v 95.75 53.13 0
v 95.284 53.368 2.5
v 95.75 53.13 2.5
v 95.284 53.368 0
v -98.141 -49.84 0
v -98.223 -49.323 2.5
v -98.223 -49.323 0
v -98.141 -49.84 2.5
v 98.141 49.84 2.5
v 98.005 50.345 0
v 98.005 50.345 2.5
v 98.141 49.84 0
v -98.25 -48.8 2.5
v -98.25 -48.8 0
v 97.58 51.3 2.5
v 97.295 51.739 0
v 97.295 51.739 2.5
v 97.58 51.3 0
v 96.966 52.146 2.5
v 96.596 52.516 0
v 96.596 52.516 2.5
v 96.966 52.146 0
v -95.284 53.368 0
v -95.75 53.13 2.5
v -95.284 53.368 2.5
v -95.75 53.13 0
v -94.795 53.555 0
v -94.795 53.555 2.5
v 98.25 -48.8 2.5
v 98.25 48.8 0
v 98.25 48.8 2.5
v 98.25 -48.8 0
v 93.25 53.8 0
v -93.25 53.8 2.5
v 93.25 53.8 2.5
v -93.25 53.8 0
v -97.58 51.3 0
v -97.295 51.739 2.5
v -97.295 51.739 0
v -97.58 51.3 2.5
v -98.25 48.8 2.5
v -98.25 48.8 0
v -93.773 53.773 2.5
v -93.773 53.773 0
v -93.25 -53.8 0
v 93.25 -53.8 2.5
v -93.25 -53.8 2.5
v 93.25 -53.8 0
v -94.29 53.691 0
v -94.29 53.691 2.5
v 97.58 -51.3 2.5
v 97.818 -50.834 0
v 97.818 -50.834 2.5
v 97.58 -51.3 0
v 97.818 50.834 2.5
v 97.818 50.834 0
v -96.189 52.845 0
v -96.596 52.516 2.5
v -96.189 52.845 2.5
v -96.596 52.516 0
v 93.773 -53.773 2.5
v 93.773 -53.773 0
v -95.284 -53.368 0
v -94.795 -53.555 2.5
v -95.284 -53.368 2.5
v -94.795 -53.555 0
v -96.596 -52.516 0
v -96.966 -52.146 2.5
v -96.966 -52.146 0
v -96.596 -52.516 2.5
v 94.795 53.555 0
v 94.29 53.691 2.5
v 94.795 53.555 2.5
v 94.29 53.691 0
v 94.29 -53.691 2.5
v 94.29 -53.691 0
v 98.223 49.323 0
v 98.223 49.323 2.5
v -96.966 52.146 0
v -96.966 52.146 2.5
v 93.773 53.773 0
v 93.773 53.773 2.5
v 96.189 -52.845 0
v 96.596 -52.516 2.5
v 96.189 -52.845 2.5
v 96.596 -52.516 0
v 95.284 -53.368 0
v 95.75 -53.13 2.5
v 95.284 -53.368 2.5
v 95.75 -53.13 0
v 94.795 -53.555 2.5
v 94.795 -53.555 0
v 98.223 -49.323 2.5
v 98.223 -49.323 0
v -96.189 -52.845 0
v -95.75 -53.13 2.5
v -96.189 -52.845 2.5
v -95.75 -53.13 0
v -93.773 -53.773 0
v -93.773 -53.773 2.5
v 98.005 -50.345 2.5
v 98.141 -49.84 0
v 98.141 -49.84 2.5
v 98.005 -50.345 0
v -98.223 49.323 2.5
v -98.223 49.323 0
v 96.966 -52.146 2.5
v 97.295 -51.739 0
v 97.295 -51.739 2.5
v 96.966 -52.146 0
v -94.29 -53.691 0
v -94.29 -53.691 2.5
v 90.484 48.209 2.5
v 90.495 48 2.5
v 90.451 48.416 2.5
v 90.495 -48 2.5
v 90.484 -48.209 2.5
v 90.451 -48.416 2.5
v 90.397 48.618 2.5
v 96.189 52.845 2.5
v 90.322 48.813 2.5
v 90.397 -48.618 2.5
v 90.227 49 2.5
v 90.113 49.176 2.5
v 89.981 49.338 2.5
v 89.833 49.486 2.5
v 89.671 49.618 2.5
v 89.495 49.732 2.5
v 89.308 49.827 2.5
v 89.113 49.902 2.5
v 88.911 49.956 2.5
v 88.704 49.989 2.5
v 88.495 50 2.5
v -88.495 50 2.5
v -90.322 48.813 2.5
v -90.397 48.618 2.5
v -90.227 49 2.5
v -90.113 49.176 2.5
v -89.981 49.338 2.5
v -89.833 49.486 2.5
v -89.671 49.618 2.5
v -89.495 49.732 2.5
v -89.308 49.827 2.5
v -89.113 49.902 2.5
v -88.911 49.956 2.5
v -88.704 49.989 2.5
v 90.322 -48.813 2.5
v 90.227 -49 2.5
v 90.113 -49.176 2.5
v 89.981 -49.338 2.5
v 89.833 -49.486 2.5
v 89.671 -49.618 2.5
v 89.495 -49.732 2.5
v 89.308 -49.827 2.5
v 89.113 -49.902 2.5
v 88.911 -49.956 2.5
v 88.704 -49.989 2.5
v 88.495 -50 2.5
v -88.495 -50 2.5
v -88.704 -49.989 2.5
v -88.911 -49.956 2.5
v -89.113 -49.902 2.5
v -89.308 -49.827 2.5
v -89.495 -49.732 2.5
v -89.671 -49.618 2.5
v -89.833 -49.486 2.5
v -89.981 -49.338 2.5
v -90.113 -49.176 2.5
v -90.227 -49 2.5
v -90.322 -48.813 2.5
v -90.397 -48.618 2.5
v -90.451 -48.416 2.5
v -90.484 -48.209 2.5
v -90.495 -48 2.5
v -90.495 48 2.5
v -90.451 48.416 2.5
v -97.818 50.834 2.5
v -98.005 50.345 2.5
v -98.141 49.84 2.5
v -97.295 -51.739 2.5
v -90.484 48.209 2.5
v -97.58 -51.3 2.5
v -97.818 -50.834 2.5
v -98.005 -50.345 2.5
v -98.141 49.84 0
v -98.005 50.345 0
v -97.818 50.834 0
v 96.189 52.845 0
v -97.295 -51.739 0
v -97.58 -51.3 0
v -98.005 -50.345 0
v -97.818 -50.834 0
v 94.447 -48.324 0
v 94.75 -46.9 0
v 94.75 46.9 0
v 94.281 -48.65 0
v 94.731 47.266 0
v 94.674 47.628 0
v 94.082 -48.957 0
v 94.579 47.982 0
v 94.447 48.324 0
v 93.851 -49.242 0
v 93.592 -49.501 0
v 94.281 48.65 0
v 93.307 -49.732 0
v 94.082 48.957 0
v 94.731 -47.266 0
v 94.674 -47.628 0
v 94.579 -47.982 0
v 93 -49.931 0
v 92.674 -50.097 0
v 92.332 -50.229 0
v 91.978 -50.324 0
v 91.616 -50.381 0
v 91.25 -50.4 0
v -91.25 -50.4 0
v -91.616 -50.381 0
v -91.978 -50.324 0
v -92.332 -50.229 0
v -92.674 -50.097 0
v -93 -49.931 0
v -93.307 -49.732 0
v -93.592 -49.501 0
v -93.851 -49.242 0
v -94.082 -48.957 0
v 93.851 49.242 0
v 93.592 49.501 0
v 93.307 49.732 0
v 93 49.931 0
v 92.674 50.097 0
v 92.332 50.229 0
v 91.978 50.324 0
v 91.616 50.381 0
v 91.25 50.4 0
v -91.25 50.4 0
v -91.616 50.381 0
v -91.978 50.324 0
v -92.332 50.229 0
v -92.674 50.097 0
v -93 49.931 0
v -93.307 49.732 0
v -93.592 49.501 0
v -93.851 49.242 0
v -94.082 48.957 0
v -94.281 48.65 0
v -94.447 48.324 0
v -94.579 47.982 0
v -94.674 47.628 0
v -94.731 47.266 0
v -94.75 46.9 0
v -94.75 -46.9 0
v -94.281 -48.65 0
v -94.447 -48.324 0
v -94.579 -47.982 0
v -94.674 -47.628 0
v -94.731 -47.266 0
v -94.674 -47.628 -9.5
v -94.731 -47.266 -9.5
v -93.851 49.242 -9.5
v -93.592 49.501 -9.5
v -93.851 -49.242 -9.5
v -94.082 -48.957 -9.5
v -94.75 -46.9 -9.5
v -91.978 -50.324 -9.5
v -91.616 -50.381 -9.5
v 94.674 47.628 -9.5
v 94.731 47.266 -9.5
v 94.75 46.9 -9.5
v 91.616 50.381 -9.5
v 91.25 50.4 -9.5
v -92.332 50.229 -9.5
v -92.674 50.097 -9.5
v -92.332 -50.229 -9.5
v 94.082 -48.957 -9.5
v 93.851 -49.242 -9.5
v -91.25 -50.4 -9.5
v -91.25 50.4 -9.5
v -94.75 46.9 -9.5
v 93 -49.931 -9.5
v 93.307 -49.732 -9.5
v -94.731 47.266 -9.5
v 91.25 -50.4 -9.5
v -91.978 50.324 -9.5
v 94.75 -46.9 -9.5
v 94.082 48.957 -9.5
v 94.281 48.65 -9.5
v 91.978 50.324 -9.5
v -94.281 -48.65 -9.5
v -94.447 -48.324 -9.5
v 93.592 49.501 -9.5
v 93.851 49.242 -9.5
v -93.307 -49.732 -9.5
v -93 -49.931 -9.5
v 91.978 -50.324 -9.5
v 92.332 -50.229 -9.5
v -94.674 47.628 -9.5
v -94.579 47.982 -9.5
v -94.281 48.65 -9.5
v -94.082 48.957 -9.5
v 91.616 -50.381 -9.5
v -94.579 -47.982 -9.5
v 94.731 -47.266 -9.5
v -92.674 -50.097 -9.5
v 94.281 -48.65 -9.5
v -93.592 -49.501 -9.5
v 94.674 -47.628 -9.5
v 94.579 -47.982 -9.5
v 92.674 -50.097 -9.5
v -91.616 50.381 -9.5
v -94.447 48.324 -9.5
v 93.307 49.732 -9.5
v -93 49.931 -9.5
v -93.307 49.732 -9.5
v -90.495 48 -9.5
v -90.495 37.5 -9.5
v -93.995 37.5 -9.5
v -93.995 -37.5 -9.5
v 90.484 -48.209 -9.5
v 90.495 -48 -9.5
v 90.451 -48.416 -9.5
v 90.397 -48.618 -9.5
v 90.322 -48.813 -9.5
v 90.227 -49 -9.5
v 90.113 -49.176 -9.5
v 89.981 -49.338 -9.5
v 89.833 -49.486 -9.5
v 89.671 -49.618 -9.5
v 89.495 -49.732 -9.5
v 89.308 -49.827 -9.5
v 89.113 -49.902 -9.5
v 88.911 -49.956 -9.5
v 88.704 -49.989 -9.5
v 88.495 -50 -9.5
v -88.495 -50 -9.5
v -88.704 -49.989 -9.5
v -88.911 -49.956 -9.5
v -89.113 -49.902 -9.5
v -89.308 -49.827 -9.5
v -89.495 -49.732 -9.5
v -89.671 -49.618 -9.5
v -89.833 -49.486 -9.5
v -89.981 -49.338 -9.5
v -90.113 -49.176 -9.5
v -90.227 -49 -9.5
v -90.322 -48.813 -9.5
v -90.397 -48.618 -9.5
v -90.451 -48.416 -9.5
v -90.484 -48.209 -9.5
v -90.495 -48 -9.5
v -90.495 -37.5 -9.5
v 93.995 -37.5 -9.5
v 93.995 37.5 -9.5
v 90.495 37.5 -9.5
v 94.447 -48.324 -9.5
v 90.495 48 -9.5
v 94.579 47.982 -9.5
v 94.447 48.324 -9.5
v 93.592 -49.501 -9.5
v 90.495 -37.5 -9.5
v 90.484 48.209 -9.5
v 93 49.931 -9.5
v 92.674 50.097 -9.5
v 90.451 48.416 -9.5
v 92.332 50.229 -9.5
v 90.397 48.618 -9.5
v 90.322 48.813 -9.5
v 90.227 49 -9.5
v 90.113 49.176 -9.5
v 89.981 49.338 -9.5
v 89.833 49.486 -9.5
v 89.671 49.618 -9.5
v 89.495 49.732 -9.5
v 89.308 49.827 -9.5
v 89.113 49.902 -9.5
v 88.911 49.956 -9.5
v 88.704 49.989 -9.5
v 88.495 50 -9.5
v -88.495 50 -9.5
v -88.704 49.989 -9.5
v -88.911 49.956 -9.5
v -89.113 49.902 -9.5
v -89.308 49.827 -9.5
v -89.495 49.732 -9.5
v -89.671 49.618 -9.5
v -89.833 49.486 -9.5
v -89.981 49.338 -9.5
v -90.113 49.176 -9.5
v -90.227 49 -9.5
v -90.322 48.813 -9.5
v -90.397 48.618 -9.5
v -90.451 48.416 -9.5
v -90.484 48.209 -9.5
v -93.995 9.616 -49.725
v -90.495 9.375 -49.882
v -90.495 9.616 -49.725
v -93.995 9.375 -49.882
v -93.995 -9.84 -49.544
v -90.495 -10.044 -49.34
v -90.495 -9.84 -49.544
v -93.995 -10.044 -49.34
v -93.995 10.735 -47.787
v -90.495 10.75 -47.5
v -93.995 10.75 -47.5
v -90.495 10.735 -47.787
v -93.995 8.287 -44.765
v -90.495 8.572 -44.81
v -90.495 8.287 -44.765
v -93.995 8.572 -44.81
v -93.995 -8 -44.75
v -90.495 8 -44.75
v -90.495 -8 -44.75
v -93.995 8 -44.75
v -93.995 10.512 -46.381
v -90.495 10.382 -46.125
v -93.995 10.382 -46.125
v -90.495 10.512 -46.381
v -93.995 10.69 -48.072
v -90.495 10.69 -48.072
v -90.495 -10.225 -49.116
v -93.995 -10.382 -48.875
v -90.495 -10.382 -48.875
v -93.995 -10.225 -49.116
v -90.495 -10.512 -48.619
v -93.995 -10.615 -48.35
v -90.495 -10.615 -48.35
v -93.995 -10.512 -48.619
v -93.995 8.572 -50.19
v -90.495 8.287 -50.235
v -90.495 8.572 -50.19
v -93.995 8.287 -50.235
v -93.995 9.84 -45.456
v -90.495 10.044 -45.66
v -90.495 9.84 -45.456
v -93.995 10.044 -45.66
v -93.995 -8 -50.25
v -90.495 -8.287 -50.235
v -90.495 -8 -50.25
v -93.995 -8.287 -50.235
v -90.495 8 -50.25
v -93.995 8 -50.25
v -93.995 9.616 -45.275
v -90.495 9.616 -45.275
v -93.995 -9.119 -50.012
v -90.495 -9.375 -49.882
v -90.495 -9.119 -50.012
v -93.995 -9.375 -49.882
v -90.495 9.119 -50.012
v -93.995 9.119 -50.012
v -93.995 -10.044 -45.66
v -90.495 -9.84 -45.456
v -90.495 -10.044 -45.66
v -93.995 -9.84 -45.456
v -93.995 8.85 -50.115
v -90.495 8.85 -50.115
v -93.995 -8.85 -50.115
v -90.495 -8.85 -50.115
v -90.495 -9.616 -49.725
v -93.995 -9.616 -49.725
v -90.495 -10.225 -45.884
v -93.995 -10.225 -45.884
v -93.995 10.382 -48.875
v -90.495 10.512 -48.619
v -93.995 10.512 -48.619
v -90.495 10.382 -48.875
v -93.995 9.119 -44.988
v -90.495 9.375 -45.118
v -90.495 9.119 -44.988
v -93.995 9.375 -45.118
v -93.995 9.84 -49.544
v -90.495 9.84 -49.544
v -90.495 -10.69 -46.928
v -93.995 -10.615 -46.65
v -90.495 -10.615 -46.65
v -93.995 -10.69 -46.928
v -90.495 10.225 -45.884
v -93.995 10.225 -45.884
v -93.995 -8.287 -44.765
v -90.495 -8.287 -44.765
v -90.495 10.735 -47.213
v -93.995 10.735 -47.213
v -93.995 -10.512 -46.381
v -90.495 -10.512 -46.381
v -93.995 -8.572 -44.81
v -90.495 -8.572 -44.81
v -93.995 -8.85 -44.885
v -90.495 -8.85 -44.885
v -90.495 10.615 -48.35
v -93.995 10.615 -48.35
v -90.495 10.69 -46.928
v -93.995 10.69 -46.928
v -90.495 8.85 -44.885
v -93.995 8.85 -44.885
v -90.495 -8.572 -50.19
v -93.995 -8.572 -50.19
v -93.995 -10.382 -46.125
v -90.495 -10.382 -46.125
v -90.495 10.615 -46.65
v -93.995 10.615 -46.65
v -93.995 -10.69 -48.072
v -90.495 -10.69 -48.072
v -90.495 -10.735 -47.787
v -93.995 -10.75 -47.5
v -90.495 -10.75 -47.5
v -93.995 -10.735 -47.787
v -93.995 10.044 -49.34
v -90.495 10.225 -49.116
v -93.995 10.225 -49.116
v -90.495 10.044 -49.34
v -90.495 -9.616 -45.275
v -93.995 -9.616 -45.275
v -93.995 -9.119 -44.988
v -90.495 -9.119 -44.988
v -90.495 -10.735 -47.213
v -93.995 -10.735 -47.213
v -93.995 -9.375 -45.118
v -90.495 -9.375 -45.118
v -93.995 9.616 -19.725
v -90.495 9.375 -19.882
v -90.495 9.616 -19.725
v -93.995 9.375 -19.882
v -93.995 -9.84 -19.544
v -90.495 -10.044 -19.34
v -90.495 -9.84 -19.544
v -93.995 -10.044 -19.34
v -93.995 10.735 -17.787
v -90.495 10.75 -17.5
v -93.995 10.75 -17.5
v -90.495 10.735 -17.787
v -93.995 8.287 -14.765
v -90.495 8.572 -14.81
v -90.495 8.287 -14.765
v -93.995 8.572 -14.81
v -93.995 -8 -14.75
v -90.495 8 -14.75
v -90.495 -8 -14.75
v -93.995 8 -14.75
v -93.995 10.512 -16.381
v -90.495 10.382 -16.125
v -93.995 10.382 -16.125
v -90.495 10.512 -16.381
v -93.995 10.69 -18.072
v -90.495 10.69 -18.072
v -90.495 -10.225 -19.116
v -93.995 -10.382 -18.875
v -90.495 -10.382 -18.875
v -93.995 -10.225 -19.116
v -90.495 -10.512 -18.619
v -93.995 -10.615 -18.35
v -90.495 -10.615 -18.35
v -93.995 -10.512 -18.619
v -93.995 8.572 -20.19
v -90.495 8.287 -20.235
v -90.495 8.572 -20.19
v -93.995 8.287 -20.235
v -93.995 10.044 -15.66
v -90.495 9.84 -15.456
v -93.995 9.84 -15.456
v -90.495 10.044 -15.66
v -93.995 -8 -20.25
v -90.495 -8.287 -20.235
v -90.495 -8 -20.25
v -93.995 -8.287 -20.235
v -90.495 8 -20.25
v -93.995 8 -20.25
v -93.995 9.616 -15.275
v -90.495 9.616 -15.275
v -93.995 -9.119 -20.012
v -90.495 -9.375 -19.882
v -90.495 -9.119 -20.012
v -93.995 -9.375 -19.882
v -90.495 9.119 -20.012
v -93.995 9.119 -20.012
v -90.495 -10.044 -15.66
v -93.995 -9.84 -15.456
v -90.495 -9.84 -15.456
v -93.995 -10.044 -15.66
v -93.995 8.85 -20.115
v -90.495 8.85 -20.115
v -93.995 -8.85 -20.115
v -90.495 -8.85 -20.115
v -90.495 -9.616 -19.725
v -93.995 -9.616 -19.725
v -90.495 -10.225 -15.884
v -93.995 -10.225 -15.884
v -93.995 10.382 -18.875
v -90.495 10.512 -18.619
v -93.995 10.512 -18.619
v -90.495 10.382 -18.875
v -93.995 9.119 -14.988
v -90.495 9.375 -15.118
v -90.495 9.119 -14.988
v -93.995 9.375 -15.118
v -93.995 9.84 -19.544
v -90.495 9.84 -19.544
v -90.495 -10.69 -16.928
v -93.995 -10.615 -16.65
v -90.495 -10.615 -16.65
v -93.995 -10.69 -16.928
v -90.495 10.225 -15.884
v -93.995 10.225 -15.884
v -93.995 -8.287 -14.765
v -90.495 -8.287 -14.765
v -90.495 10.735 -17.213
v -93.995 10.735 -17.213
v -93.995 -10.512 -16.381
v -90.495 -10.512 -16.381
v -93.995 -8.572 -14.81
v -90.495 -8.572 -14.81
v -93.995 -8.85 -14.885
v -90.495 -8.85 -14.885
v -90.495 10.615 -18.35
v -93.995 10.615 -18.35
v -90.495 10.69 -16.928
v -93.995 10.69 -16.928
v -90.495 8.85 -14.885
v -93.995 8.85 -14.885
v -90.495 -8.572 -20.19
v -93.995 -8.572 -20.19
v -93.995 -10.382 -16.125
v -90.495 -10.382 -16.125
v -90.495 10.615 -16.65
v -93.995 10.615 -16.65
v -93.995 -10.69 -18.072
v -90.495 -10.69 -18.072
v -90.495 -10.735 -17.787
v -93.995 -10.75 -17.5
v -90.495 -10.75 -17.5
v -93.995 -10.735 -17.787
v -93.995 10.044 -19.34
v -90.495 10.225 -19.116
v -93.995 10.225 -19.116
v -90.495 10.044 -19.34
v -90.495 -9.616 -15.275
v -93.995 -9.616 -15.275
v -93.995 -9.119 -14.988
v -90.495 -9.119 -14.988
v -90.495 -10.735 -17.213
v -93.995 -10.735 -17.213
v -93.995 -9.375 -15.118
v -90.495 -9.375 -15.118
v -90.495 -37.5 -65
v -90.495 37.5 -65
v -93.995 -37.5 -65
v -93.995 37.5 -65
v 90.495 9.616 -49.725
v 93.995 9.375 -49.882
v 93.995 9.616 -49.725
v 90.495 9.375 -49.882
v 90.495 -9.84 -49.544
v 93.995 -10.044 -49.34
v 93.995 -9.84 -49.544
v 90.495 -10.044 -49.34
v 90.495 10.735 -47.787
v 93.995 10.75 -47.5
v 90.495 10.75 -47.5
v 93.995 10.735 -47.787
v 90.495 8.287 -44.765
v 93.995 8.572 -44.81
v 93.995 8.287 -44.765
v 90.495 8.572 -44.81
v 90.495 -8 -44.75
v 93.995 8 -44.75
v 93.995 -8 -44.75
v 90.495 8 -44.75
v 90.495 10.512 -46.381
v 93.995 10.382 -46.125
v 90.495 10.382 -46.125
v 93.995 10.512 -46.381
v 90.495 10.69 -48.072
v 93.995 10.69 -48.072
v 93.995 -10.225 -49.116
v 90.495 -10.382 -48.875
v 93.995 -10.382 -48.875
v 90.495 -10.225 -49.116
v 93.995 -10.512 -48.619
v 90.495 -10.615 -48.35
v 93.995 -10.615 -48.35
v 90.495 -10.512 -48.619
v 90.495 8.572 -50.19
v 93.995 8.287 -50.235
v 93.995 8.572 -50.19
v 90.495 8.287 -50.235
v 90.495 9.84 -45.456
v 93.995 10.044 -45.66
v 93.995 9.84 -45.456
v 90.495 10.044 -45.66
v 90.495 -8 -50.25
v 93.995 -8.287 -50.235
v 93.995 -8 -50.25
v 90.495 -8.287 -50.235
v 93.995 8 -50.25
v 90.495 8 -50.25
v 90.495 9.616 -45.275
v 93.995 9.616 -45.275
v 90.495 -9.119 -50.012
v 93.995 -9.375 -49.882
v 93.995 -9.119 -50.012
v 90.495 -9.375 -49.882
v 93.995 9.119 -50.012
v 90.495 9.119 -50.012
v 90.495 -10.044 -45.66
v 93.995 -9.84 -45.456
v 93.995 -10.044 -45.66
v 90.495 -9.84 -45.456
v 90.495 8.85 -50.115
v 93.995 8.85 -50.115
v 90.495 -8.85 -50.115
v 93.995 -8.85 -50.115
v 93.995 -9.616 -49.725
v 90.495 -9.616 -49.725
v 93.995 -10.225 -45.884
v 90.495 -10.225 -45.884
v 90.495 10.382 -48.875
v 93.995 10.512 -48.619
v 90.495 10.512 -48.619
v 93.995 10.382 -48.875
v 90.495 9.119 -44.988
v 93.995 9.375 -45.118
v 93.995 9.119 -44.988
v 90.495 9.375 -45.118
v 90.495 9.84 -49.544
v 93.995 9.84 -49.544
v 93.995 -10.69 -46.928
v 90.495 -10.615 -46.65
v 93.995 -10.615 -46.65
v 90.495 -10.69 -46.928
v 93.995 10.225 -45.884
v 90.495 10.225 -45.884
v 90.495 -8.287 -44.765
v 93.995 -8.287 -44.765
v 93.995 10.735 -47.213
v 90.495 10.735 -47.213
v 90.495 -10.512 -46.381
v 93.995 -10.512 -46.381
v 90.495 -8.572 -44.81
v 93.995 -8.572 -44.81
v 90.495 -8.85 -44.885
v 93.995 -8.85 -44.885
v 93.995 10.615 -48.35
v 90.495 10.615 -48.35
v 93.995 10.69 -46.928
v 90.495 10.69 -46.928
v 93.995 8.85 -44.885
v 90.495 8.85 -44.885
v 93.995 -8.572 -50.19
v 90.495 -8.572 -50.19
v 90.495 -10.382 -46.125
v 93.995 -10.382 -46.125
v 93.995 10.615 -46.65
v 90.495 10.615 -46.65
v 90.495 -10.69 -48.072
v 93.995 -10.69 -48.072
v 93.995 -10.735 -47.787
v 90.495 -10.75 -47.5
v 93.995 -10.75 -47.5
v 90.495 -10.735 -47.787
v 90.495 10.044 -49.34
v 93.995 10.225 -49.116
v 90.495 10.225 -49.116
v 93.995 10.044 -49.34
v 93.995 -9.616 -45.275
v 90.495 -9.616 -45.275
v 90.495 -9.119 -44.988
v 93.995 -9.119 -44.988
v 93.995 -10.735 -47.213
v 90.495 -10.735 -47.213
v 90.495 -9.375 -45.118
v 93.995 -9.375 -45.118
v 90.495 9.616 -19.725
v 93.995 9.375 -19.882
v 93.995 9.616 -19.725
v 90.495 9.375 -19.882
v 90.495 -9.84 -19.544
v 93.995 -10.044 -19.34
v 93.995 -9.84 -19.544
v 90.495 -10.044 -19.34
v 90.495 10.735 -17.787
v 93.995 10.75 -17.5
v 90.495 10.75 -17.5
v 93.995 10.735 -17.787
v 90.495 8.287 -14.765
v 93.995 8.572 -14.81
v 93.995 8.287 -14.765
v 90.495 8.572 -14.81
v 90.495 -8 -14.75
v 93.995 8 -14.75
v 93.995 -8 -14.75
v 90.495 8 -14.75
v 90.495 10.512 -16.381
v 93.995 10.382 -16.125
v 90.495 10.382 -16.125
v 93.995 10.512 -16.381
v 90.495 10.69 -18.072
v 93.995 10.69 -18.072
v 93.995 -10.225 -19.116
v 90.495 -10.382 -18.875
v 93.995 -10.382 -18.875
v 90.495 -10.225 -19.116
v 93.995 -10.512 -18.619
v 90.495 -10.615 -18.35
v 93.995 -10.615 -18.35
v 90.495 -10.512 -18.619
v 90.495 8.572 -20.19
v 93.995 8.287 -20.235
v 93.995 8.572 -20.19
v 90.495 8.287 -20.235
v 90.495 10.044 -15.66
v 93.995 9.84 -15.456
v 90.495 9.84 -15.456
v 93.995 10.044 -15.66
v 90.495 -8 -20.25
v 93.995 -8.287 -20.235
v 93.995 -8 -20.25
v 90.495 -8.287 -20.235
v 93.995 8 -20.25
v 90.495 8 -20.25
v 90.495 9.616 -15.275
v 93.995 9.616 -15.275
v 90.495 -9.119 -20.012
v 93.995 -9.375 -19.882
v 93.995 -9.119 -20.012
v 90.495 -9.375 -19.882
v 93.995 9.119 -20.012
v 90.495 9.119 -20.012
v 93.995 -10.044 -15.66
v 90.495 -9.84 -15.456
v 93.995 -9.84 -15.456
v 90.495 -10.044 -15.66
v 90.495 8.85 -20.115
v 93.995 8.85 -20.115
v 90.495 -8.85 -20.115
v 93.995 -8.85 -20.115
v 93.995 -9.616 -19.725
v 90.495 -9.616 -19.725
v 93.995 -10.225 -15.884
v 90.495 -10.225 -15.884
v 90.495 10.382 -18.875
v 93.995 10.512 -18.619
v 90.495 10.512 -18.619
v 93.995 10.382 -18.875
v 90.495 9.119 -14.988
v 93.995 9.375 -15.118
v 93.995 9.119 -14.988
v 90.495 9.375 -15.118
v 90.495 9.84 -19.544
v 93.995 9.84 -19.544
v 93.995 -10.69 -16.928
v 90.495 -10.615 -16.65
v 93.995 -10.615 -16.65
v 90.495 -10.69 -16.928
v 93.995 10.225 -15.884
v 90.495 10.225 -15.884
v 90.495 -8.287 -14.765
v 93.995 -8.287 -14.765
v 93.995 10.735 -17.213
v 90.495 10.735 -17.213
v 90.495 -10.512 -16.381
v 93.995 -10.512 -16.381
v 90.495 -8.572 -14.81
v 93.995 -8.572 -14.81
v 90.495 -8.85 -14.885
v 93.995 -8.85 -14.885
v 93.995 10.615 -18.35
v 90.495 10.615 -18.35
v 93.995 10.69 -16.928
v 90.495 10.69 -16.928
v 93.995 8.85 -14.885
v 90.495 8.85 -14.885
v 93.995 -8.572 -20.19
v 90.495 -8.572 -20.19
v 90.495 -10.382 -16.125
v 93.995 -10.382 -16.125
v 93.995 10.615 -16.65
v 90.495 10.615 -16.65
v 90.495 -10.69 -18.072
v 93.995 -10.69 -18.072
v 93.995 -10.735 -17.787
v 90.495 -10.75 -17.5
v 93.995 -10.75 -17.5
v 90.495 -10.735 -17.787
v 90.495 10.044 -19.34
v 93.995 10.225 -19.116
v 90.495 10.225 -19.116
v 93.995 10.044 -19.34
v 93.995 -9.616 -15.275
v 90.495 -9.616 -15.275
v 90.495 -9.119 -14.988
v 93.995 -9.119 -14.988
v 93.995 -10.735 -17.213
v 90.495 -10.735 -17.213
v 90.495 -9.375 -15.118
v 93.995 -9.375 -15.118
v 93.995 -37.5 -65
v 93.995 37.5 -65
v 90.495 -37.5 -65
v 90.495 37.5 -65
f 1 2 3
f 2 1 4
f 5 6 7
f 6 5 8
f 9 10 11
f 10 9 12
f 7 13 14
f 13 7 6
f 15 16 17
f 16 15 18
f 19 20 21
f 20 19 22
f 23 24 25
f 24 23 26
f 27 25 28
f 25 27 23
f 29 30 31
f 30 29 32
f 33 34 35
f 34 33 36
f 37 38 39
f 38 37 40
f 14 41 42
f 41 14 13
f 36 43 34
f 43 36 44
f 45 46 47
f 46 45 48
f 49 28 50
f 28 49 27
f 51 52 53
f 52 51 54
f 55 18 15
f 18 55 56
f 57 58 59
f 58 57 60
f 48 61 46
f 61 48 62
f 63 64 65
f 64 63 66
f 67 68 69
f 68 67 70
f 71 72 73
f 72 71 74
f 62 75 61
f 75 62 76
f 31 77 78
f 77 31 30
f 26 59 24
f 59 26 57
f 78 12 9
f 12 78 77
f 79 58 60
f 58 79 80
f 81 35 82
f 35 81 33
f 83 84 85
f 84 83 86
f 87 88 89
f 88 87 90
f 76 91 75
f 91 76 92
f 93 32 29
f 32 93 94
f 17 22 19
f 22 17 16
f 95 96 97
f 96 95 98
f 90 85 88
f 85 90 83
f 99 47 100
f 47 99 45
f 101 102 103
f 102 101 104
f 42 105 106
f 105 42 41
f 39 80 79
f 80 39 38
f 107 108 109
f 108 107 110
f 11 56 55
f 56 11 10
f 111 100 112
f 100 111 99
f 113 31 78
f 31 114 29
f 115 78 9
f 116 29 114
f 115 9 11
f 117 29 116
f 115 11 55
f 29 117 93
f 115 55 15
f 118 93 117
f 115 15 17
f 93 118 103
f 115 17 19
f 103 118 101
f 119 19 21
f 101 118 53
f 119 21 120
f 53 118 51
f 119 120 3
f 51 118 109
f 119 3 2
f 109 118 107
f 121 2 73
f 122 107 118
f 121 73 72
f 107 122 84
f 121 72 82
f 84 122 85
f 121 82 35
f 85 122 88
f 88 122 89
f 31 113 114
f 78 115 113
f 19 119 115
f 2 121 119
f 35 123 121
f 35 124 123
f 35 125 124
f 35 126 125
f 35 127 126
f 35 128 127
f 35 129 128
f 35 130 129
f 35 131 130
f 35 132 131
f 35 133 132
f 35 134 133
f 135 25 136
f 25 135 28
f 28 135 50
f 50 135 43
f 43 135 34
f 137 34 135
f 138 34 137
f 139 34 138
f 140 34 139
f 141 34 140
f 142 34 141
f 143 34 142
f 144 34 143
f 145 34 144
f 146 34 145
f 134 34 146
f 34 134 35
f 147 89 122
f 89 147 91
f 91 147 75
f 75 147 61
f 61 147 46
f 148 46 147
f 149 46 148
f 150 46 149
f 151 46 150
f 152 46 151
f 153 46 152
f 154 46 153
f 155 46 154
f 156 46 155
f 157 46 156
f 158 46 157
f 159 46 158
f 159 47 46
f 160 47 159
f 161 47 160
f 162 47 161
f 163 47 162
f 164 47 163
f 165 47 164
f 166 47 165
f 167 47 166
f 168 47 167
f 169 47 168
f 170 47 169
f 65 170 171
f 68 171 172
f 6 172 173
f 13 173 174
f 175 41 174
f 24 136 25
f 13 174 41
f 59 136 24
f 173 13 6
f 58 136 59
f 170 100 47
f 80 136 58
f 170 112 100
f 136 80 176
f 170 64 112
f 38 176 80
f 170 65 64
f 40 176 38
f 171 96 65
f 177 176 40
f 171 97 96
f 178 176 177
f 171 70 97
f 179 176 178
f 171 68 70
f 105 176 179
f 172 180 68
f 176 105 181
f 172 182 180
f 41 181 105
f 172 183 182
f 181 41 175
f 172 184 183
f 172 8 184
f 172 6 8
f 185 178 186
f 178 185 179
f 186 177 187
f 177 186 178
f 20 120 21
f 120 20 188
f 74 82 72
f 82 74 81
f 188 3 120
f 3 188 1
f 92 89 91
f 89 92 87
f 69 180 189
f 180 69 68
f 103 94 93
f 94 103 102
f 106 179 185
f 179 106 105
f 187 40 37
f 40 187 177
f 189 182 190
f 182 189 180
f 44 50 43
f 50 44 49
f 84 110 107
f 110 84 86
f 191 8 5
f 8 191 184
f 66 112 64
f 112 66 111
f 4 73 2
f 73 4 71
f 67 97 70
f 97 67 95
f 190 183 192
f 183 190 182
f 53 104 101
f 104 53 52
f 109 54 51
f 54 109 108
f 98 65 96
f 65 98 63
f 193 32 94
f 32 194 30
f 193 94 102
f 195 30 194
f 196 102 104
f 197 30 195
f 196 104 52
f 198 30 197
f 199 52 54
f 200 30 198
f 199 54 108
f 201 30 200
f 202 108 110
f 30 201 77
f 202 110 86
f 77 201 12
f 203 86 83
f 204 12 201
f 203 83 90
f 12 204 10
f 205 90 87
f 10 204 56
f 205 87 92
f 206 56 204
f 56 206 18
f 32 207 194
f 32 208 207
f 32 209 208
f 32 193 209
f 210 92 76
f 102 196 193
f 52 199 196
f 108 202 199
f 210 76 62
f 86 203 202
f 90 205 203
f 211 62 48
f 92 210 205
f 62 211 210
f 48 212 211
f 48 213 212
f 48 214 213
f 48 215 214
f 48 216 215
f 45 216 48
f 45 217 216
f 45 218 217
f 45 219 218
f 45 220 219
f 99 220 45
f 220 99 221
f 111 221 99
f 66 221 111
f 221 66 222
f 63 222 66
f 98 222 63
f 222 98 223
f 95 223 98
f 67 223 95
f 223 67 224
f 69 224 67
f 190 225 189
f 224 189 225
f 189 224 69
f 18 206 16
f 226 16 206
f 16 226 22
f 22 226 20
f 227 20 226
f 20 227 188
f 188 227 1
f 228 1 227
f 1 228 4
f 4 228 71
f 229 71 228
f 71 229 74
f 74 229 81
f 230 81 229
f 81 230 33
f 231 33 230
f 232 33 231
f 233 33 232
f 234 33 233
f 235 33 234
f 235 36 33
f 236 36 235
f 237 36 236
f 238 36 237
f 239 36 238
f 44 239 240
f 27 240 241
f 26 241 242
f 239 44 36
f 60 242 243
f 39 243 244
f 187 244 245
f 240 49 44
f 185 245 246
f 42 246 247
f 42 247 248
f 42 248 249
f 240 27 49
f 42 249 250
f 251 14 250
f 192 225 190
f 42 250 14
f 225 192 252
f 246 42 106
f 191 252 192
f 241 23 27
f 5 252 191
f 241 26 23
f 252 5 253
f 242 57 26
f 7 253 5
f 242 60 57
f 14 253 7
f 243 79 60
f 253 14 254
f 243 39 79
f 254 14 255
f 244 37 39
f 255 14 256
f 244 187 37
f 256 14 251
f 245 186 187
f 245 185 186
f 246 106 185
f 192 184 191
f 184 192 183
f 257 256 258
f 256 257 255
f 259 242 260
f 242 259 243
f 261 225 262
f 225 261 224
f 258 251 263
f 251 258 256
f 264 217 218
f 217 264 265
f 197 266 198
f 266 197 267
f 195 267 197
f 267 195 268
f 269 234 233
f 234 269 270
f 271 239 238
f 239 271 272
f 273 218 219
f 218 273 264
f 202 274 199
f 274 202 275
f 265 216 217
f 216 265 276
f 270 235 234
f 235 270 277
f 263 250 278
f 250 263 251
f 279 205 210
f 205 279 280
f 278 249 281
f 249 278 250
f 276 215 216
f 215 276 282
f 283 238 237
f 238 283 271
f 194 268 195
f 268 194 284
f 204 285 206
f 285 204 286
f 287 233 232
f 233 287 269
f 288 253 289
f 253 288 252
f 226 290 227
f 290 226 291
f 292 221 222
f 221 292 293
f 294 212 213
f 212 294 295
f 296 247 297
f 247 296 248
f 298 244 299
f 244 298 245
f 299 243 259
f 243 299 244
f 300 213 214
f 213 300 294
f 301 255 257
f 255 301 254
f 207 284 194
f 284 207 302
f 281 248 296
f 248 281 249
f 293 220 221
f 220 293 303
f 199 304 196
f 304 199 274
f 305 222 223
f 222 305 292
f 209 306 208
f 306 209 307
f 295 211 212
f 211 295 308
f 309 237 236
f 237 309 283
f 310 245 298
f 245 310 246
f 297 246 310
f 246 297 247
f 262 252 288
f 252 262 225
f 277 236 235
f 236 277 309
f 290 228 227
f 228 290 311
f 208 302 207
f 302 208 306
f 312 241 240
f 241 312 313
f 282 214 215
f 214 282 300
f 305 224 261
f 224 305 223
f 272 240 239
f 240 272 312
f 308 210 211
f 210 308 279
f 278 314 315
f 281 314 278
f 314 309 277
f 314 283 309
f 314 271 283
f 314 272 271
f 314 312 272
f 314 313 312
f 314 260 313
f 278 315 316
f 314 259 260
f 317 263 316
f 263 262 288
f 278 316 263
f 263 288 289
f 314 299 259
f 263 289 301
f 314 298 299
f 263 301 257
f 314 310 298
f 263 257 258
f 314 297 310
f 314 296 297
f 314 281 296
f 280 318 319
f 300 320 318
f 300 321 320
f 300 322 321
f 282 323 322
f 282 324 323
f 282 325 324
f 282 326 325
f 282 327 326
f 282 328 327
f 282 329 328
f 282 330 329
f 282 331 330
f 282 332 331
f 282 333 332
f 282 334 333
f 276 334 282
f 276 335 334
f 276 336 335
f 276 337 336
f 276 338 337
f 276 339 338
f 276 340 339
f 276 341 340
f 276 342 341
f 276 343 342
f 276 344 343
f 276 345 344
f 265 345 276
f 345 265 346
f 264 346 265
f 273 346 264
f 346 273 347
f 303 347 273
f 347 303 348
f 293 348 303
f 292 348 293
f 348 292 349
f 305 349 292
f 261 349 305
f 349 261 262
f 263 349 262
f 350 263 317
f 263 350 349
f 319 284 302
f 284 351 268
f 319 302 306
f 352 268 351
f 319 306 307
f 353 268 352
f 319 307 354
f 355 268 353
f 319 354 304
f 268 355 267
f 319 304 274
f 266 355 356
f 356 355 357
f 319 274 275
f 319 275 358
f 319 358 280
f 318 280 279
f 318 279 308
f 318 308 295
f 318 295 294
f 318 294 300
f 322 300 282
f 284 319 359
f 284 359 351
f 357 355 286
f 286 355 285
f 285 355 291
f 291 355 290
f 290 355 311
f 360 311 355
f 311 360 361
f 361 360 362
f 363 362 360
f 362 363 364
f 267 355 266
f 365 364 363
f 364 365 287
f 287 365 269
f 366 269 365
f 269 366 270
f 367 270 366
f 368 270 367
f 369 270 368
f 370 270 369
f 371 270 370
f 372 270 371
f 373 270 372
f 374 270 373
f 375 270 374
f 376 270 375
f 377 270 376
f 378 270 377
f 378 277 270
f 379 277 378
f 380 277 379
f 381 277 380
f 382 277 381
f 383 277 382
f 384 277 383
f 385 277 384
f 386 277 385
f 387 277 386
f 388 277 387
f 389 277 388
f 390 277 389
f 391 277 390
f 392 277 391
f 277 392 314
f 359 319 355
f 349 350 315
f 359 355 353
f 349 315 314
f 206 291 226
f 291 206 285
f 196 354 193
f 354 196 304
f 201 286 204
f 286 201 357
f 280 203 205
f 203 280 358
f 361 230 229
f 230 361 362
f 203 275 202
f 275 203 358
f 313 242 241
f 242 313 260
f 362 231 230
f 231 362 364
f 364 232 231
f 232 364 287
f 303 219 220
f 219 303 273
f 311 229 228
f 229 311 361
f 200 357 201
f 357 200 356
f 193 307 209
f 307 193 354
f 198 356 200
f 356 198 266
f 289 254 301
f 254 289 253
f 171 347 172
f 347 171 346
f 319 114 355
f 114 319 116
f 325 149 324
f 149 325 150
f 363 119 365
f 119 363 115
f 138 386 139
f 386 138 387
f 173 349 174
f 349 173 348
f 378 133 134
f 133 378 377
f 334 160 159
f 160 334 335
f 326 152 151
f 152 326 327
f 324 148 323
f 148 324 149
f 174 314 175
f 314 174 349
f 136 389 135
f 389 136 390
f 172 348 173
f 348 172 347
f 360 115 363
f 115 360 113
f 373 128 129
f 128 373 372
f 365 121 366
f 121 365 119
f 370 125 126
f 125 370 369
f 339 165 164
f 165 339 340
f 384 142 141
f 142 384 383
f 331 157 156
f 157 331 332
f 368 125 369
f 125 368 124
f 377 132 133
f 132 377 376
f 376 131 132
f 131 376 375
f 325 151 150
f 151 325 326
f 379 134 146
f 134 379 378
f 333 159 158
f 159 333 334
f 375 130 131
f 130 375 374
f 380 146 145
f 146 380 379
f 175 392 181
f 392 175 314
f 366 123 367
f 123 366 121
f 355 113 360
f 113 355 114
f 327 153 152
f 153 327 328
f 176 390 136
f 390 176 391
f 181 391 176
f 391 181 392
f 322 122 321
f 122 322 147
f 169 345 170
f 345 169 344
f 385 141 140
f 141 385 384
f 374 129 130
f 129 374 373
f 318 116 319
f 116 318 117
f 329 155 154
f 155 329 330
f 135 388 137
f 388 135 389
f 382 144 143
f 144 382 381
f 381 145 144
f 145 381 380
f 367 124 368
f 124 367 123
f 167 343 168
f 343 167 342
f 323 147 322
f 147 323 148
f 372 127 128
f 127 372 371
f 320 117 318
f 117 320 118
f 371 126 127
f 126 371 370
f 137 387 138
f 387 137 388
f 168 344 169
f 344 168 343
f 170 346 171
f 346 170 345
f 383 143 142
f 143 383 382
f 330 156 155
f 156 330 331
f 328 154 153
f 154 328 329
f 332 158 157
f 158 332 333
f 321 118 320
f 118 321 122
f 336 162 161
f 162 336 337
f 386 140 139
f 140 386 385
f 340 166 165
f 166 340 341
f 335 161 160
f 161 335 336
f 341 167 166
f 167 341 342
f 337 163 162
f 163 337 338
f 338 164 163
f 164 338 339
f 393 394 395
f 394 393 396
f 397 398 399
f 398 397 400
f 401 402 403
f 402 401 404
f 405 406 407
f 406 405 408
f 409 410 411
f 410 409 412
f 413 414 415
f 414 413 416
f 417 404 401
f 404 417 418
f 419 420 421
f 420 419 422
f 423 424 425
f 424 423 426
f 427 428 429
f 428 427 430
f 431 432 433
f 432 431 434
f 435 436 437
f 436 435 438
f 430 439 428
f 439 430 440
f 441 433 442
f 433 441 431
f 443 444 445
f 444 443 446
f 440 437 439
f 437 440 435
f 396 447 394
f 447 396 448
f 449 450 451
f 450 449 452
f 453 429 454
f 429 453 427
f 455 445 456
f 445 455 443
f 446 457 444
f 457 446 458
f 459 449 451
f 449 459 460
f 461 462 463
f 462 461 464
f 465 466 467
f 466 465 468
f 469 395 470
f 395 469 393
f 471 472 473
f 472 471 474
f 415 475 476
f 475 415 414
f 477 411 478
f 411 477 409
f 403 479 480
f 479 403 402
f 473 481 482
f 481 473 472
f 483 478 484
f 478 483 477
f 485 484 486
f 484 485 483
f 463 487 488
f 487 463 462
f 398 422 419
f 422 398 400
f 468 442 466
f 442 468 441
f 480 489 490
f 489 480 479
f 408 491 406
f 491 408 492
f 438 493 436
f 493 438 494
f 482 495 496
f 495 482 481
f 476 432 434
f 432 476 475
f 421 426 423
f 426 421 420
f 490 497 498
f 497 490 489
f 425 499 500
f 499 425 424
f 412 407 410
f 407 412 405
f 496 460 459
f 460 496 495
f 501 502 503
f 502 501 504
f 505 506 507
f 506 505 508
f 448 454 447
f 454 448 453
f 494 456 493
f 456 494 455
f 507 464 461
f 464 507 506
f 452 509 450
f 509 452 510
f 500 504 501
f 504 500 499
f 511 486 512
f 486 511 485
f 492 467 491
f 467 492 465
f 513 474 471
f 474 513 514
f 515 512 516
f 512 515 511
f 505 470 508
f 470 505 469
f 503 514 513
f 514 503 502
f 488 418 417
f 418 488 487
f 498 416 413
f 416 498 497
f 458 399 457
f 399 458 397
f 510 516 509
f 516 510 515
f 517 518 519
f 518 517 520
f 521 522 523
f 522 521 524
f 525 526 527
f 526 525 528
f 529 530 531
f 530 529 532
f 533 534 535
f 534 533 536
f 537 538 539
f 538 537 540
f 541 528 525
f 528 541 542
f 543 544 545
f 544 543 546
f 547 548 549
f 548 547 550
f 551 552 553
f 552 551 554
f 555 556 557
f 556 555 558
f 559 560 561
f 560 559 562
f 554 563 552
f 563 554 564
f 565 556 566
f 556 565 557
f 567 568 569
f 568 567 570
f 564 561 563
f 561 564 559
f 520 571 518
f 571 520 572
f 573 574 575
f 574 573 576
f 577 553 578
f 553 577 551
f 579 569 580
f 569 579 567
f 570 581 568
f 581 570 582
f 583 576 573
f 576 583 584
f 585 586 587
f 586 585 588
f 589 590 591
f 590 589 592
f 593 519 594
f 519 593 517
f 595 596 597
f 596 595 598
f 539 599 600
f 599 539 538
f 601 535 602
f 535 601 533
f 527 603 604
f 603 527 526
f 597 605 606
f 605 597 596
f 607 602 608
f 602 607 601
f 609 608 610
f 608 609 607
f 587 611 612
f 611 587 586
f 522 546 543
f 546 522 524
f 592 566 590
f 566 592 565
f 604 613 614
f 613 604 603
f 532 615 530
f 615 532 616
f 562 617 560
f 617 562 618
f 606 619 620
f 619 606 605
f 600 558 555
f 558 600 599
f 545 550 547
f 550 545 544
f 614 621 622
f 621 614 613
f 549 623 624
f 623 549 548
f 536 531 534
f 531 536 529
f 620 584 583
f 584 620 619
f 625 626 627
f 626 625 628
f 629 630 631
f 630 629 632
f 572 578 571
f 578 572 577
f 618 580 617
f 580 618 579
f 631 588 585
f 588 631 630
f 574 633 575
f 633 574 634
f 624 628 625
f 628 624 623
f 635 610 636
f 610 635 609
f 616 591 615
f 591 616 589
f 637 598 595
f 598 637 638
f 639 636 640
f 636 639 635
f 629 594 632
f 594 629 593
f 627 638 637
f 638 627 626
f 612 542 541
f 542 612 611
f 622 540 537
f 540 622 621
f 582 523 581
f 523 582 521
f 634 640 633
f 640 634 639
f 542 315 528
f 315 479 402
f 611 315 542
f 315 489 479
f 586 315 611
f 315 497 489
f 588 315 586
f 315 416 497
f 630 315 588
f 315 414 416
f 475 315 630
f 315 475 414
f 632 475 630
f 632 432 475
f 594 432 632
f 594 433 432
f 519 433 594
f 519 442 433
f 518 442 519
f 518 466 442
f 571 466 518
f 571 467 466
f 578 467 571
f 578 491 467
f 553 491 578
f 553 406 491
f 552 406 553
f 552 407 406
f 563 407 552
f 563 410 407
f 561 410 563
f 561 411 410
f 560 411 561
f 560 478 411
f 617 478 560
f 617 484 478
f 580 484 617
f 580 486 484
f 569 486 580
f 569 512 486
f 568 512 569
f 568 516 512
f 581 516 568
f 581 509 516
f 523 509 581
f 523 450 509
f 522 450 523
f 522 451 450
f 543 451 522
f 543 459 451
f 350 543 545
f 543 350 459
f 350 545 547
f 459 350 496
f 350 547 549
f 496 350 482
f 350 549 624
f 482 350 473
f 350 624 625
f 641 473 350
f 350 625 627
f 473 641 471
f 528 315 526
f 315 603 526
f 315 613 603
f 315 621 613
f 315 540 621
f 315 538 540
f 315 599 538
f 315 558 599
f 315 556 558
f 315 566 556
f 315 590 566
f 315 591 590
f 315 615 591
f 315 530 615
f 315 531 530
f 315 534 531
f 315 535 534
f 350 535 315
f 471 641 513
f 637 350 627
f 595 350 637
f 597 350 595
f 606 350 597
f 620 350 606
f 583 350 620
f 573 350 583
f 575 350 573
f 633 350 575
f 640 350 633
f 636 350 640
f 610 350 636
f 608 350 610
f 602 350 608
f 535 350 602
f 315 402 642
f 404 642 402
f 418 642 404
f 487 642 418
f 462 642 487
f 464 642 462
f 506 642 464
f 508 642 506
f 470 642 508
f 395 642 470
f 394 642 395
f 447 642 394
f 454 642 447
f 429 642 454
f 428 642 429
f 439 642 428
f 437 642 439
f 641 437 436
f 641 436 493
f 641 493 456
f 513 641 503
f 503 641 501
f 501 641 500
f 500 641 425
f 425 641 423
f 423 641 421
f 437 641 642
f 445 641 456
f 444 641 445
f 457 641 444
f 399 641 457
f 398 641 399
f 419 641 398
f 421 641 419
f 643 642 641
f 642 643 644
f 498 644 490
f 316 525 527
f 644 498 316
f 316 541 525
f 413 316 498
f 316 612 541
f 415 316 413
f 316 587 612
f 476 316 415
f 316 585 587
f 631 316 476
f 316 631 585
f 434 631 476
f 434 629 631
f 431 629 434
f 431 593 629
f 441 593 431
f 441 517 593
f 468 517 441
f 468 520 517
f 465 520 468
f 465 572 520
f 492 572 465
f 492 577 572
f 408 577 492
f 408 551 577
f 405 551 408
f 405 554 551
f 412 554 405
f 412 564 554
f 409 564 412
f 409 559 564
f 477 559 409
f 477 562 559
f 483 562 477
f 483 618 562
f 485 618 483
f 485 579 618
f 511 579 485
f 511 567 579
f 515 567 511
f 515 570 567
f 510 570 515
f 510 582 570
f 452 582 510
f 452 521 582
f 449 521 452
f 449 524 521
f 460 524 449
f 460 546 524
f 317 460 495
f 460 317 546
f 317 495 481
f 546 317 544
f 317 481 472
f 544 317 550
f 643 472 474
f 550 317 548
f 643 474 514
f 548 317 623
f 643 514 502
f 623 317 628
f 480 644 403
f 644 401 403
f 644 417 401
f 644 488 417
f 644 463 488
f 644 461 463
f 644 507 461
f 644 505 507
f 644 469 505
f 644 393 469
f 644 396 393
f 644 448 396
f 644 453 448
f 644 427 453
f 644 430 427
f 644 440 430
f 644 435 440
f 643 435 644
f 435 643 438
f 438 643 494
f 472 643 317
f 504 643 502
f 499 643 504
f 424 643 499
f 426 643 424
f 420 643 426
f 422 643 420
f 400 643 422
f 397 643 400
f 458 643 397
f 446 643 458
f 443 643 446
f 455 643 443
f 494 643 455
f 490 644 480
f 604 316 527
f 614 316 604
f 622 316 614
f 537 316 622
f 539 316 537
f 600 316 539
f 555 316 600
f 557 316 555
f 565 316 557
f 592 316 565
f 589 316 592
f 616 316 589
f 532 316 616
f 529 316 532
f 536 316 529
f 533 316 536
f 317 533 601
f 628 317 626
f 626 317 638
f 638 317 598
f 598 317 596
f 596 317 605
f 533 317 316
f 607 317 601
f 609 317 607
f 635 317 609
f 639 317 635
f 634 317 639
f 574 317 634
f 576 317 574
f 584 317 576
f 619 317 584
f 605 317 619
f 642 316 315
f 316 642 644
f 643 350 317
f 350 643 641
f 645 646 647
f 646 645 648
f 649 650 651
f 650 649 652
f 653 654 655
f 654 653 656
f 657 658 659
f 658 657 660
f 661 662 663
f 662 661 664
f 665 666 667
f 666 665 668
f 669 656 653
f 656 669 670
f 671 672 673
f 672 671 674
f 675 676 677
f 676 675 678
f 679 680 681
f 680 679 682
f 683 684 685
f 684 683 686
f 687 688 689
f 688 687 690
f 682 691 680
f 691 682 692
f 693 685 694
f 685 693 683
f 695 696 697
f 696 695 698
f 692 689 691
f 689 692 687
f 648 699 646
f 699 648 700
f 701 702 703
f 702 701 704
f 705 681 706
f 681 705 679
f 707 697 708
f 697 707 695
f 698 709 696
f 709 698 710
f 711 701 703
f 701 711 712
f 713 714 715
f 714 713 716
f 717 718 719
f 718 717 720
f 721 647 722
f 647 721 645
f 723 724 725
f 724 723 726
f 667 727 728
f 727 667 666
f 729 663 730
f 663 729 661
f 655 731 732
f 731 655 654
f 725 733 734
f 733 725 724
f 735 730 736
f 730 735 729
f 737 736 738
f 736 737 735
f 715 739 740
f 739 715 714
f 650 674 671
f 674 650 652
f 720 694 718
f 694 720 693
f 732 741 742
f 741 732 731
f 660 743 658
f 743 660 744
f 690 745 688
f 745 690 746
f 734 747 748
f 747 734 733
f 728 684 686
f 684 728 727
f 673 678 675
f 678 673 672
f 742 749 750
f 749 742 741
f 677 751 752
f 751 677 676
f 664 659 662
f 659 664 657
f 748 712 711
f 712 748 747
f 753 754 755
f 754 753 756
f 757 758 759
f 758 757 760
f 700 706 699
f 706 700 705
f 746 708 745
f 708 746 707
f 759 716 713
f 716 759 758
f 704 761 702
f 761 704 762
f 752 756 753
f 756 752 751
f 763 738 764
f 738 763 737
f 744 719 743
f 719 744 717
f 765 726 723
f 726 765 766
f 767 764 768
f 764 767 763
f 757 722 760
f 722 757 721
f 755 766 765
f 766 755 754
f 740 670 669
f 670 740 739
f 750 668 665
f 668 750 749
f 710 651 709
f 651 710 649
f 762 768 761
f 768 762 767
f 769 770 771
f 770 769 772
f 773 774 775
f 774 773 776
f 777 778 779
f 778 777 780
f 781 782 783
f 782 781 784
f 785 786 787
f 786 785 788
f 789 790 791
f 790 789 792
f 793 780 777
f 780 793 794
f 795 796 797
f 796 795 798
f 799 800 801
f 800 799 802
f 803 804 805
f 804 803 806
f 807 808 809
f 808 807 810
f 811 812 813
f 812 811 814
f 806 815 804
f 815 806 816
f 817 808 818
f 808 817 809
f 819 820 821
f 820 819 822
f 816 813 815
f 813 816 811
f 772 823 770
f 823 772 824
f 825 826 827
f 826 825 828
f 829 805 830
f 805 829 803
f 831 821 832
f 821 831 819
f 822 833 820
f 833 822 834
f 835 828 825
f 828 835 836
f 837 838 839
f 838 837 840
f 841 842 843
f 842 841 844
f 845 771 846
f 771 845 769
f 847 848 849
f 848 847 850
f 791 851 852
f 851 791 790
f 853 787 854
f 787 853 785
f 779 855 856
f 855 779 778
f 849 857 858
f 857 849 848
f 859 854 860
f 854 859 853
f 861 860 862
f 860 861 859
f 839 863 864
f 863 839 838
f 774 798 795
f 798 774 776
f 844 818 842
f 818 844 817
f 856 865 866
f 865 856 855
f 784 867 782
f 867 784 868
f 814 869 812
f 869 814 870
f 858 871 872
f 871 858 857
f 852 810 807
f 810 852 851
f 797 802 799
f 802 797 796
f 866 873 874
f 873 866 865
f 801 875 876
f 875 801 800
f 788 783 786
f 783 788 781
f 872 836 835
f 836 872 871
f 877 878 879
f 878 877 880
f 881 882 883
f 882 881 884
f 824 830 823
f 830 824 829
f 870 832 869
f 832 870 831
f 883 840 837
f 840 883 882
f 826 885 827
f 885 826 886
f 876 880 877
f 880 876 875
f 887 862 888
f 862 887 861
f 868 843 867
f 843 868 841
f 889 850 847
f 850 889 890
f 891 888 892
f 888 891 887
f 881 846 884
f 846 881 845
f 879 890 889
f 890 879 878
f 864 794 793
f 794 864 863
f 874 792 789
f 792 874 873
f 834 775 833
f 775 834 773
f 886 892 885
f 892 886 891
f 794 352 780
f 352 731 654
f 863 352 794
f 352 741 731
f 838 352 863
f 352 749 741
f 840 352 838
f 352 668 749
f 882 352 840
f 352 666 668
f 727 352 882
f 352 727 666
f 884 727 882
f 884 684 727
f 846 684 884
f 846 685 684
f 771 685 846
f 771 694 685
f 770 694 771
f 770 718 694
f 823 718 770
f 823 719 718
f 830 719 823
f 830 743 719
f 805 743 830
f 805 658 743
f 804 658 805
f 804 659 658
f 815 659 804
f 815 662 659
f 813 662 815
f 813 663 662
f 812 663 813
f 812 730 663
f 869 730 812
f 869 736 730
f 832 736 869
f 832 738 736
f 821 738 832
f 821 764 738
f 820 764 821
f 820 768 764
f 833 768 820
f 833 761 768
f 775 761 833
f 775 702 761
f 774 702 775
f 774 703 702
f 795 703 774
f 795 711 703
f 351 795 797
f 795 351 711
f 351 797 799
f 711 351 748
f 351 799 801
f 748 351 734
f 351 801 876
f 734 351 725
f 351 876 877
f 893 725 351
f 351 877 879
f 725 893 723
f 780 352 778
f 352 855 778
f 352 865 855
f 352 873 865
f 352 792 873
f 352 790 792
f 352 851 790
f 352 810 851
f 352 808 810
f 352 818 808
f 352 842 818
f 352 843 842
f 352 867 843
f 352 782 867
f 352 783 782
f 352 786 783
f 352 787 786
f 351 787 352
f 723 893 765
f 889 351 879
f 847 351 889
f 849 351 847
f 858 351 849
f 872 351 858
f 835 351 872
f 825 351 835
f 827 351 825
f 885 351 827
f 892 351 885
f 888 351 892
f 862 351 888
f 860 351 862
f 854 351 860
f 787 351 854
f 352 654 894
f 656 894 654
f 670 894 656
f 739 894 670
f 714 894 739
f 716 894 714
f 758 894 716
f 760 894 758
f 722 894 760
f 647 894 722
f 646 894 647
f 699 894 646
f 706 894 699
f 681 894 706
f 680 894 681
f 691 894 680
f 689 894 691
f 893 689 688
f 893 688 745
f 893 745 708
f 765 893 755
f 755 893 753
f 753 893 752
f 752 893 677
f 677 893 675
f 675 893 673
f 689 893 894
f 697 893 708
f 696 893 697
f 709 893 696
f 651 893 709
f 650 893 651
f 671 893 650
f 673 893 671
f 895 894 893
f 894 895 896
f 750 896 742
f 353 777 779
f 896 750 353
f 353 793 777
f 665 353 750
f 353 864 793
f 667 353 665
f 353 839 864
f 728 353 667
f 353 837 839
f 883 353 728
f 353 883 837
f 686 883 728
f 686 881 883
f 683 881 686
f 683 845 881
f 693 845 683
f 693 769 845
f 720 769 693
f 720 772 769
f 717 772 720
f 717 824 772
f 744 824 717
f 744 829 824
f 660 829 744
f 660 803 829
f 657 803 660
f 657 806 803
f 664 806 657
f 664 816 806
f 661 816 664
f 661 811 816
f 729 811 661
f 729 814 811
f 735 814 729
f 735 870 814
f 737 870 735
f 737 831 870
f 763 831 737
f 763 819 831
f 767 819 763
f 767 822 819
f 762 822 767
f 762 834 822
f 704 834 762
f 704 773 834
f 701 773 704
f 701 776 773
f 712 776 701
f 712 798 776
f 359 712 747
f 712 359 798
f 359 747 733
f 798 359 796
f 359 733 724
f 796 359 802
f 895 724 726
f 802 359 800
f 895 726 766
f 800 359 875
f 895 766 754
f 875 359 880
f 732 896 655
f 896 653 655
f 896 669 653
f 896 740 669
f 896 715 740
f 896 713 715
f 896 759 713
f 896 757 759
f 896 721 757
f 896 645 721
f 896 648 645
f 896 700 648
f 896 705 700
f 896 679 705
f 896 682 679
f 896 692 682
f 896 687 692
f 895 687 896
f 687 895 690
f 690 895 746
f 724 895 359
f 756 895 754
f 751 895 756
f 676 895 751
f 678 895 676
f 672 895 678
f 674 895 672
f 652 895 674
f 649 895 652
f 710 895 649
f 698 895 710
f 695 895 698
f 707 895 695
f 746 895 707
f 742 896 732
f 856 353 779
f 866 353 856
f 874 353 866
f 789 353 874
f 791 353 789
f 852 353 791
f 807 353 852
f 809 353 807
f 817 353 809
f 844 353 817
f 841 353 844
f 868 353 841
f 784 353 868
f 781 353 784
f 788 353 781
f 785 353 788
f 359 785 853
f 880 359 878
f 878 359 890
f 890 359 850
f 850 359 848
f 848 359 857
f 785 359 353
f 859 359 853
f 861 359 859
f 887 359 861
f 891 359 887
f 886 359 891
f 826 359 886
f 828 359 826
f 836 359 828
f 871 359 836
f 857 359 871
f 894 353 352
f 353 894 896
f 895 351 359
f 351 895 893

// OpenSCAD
// =============================================================================
// 2004 Ford Focus SVT · JVC KW-V830BT Custom Radio Adapter
// =============================================================================
// Solves Metra 95-5806 pinching issue on JVC Double-DIN head unit faceplate.
// Compatible with OpenSCAD 2021+ or any 3D slicer.

$fn = 60;

// --- Primary Dimensions (mm) ---
jvc_width       = 179.39; // Measured JVC KW-V830BT faceplate width
jvc_height      = 98.43;  // Measured JVC KW-V830BT faceplate height
dash_opening_w  = 190.50; // Measured Focus SVT dash opening width (7.50")
dash_opening_h  = 101.60; // Measured Focus SVT dash opening height (4.00")

// --- Clearances & Tolerances ---
clearance_w     = 1.60;   // Total width clearance (+0.80 mm per side)
clearance_h     = 1.57;   // Total height clearance (+0.78 mm top & bottom)

// --- Flange & Boss Geometry ---
flange_overlap  = 3.00;   // Overlap past dash opening on all sides
flange_thick    = 2.50;   // Front faceplate thickness
boss_insertion  = 9.50;   // Depth of alignment boss into dash opening
boss_clearance  = 0.50;   // Slip clearance per side into dash opening

// --- Radii ---
flange_r        = 5.00;   // Outer flange corner radius
boss_r          = 3.50;   // Alignment boss corner radius
cutout_r        = 2.00;   // Inner cutout corner radius

// --- Mode Selection ---
// 1 = Stepped Front Trim Bezel (re-uses Metra / ISO side brackets)
// 2 = All-in-One Housing Cage (integrated side brackets with ISO M5 slots)
adapter_mode    = 2;

// --- Calculated Dimensions ---
cutout_w = jvc_width + clearance_w;       // 180.99 mm
cutout_h = jvc_height + clearance_h;      // 100.00 mm
flange_w = dash_opening_w + 2 * flange_overlap; // 196.50 mm
flange_h = dash_opening_h + 2 * flange_overlap; // 107.60 mm
boss_w   = dash_opening_w - 2 * boss_clearance; // 189.50 mm
boss_h   = dash_opening_h - 2 * (boss_clearance - 0.1); // 100.80 mm

// Helper: 2D Rounded Rectangle centered at origin
module rounded_rect(w, h, r) {
    hull() {
        translate([ (w/2 - r),  (h/2 - r)]) circle(r=r);
        translate([-(w/2 - r),  (h/2 - r)]) circle(r=r);
        translate([-(w/2 - r), -(h/2 - r)]) circle(r=r);
        translate([ (w/2 - r), -(h/2 - r)]) circle(r=r);
    }
}

// -----------------------------------------------------------------------------
// Model 1: Stepped Trim Bezel
// -----------------------------------------------------------------------------
module trim_bezel() {
    difference() {
        union() {
            // Front overlap flange (Z = 0 to flange_thick)
            linear_extrude(height = flange_thick)
                rounded_rect(flange_w, flange_h, flange_r);
            
            // Rear insertion alignment boss (Z = -boss_insertion to 0)
            translate([0, 0, -boss_insertion])
                linear_extrude(height = boss_insertion)
                    rounded_rect(boss_w, boss_h, boss_r);
        }
        
        // Through-cutout for JVC head unit
        translate([0, 0, -boss_insertion - 1])
            linear_extrude(height = boss_insertion + flange_thick + 2)
                rounded_rect(cutout_w, cutout_h, cutout_r);
    }
}

// -----------------------------------------------------------------------------
// Model 2: Unibody Cage with Side Mounting Arms
// -----------------------------------------------------------------------------
module unibody_cage() {
    bracket_depth = 65.0; // Depth of side brackets along radio chassis
    bracket_thick = 3.5;  // Wall thickness of side brackets
    
    union() {
        // Front trim bezel
        trim_bezel();
        
        // Left & Right Side Brackets
        for (side = [-1, 1]) {
            translate([side * (cutout_w / 2 + bracket_thick / 2), 0, -bracket_depth / 2])
            difference() {
                // Bracket wall
                cube([bracket_thick, cutout_h * 0.75, bracket_depth], center = true);
                
                // Slotted ISO M5 mounting screw holes (Standard 35mm pitch)
                for (z_off = [-15, 15]) {
                    translate([0, 0, z_off])
                        rotate([0, 90, 0])
                            hull() {
                                translate([0, -8, 0]) cylinder(h = bracket_thick + 2, d = 5.5, center = true);
                                translate([0,  8, 0]) cylinder(h = bracket_thick + 2, d = 5.5, center = true);
                            }
                }
            }
        }
    }
}

// Render based on selected mode
if (adapter_mode == 1) {
    trim_bezel();
} else {
    unibody_cage();
}
